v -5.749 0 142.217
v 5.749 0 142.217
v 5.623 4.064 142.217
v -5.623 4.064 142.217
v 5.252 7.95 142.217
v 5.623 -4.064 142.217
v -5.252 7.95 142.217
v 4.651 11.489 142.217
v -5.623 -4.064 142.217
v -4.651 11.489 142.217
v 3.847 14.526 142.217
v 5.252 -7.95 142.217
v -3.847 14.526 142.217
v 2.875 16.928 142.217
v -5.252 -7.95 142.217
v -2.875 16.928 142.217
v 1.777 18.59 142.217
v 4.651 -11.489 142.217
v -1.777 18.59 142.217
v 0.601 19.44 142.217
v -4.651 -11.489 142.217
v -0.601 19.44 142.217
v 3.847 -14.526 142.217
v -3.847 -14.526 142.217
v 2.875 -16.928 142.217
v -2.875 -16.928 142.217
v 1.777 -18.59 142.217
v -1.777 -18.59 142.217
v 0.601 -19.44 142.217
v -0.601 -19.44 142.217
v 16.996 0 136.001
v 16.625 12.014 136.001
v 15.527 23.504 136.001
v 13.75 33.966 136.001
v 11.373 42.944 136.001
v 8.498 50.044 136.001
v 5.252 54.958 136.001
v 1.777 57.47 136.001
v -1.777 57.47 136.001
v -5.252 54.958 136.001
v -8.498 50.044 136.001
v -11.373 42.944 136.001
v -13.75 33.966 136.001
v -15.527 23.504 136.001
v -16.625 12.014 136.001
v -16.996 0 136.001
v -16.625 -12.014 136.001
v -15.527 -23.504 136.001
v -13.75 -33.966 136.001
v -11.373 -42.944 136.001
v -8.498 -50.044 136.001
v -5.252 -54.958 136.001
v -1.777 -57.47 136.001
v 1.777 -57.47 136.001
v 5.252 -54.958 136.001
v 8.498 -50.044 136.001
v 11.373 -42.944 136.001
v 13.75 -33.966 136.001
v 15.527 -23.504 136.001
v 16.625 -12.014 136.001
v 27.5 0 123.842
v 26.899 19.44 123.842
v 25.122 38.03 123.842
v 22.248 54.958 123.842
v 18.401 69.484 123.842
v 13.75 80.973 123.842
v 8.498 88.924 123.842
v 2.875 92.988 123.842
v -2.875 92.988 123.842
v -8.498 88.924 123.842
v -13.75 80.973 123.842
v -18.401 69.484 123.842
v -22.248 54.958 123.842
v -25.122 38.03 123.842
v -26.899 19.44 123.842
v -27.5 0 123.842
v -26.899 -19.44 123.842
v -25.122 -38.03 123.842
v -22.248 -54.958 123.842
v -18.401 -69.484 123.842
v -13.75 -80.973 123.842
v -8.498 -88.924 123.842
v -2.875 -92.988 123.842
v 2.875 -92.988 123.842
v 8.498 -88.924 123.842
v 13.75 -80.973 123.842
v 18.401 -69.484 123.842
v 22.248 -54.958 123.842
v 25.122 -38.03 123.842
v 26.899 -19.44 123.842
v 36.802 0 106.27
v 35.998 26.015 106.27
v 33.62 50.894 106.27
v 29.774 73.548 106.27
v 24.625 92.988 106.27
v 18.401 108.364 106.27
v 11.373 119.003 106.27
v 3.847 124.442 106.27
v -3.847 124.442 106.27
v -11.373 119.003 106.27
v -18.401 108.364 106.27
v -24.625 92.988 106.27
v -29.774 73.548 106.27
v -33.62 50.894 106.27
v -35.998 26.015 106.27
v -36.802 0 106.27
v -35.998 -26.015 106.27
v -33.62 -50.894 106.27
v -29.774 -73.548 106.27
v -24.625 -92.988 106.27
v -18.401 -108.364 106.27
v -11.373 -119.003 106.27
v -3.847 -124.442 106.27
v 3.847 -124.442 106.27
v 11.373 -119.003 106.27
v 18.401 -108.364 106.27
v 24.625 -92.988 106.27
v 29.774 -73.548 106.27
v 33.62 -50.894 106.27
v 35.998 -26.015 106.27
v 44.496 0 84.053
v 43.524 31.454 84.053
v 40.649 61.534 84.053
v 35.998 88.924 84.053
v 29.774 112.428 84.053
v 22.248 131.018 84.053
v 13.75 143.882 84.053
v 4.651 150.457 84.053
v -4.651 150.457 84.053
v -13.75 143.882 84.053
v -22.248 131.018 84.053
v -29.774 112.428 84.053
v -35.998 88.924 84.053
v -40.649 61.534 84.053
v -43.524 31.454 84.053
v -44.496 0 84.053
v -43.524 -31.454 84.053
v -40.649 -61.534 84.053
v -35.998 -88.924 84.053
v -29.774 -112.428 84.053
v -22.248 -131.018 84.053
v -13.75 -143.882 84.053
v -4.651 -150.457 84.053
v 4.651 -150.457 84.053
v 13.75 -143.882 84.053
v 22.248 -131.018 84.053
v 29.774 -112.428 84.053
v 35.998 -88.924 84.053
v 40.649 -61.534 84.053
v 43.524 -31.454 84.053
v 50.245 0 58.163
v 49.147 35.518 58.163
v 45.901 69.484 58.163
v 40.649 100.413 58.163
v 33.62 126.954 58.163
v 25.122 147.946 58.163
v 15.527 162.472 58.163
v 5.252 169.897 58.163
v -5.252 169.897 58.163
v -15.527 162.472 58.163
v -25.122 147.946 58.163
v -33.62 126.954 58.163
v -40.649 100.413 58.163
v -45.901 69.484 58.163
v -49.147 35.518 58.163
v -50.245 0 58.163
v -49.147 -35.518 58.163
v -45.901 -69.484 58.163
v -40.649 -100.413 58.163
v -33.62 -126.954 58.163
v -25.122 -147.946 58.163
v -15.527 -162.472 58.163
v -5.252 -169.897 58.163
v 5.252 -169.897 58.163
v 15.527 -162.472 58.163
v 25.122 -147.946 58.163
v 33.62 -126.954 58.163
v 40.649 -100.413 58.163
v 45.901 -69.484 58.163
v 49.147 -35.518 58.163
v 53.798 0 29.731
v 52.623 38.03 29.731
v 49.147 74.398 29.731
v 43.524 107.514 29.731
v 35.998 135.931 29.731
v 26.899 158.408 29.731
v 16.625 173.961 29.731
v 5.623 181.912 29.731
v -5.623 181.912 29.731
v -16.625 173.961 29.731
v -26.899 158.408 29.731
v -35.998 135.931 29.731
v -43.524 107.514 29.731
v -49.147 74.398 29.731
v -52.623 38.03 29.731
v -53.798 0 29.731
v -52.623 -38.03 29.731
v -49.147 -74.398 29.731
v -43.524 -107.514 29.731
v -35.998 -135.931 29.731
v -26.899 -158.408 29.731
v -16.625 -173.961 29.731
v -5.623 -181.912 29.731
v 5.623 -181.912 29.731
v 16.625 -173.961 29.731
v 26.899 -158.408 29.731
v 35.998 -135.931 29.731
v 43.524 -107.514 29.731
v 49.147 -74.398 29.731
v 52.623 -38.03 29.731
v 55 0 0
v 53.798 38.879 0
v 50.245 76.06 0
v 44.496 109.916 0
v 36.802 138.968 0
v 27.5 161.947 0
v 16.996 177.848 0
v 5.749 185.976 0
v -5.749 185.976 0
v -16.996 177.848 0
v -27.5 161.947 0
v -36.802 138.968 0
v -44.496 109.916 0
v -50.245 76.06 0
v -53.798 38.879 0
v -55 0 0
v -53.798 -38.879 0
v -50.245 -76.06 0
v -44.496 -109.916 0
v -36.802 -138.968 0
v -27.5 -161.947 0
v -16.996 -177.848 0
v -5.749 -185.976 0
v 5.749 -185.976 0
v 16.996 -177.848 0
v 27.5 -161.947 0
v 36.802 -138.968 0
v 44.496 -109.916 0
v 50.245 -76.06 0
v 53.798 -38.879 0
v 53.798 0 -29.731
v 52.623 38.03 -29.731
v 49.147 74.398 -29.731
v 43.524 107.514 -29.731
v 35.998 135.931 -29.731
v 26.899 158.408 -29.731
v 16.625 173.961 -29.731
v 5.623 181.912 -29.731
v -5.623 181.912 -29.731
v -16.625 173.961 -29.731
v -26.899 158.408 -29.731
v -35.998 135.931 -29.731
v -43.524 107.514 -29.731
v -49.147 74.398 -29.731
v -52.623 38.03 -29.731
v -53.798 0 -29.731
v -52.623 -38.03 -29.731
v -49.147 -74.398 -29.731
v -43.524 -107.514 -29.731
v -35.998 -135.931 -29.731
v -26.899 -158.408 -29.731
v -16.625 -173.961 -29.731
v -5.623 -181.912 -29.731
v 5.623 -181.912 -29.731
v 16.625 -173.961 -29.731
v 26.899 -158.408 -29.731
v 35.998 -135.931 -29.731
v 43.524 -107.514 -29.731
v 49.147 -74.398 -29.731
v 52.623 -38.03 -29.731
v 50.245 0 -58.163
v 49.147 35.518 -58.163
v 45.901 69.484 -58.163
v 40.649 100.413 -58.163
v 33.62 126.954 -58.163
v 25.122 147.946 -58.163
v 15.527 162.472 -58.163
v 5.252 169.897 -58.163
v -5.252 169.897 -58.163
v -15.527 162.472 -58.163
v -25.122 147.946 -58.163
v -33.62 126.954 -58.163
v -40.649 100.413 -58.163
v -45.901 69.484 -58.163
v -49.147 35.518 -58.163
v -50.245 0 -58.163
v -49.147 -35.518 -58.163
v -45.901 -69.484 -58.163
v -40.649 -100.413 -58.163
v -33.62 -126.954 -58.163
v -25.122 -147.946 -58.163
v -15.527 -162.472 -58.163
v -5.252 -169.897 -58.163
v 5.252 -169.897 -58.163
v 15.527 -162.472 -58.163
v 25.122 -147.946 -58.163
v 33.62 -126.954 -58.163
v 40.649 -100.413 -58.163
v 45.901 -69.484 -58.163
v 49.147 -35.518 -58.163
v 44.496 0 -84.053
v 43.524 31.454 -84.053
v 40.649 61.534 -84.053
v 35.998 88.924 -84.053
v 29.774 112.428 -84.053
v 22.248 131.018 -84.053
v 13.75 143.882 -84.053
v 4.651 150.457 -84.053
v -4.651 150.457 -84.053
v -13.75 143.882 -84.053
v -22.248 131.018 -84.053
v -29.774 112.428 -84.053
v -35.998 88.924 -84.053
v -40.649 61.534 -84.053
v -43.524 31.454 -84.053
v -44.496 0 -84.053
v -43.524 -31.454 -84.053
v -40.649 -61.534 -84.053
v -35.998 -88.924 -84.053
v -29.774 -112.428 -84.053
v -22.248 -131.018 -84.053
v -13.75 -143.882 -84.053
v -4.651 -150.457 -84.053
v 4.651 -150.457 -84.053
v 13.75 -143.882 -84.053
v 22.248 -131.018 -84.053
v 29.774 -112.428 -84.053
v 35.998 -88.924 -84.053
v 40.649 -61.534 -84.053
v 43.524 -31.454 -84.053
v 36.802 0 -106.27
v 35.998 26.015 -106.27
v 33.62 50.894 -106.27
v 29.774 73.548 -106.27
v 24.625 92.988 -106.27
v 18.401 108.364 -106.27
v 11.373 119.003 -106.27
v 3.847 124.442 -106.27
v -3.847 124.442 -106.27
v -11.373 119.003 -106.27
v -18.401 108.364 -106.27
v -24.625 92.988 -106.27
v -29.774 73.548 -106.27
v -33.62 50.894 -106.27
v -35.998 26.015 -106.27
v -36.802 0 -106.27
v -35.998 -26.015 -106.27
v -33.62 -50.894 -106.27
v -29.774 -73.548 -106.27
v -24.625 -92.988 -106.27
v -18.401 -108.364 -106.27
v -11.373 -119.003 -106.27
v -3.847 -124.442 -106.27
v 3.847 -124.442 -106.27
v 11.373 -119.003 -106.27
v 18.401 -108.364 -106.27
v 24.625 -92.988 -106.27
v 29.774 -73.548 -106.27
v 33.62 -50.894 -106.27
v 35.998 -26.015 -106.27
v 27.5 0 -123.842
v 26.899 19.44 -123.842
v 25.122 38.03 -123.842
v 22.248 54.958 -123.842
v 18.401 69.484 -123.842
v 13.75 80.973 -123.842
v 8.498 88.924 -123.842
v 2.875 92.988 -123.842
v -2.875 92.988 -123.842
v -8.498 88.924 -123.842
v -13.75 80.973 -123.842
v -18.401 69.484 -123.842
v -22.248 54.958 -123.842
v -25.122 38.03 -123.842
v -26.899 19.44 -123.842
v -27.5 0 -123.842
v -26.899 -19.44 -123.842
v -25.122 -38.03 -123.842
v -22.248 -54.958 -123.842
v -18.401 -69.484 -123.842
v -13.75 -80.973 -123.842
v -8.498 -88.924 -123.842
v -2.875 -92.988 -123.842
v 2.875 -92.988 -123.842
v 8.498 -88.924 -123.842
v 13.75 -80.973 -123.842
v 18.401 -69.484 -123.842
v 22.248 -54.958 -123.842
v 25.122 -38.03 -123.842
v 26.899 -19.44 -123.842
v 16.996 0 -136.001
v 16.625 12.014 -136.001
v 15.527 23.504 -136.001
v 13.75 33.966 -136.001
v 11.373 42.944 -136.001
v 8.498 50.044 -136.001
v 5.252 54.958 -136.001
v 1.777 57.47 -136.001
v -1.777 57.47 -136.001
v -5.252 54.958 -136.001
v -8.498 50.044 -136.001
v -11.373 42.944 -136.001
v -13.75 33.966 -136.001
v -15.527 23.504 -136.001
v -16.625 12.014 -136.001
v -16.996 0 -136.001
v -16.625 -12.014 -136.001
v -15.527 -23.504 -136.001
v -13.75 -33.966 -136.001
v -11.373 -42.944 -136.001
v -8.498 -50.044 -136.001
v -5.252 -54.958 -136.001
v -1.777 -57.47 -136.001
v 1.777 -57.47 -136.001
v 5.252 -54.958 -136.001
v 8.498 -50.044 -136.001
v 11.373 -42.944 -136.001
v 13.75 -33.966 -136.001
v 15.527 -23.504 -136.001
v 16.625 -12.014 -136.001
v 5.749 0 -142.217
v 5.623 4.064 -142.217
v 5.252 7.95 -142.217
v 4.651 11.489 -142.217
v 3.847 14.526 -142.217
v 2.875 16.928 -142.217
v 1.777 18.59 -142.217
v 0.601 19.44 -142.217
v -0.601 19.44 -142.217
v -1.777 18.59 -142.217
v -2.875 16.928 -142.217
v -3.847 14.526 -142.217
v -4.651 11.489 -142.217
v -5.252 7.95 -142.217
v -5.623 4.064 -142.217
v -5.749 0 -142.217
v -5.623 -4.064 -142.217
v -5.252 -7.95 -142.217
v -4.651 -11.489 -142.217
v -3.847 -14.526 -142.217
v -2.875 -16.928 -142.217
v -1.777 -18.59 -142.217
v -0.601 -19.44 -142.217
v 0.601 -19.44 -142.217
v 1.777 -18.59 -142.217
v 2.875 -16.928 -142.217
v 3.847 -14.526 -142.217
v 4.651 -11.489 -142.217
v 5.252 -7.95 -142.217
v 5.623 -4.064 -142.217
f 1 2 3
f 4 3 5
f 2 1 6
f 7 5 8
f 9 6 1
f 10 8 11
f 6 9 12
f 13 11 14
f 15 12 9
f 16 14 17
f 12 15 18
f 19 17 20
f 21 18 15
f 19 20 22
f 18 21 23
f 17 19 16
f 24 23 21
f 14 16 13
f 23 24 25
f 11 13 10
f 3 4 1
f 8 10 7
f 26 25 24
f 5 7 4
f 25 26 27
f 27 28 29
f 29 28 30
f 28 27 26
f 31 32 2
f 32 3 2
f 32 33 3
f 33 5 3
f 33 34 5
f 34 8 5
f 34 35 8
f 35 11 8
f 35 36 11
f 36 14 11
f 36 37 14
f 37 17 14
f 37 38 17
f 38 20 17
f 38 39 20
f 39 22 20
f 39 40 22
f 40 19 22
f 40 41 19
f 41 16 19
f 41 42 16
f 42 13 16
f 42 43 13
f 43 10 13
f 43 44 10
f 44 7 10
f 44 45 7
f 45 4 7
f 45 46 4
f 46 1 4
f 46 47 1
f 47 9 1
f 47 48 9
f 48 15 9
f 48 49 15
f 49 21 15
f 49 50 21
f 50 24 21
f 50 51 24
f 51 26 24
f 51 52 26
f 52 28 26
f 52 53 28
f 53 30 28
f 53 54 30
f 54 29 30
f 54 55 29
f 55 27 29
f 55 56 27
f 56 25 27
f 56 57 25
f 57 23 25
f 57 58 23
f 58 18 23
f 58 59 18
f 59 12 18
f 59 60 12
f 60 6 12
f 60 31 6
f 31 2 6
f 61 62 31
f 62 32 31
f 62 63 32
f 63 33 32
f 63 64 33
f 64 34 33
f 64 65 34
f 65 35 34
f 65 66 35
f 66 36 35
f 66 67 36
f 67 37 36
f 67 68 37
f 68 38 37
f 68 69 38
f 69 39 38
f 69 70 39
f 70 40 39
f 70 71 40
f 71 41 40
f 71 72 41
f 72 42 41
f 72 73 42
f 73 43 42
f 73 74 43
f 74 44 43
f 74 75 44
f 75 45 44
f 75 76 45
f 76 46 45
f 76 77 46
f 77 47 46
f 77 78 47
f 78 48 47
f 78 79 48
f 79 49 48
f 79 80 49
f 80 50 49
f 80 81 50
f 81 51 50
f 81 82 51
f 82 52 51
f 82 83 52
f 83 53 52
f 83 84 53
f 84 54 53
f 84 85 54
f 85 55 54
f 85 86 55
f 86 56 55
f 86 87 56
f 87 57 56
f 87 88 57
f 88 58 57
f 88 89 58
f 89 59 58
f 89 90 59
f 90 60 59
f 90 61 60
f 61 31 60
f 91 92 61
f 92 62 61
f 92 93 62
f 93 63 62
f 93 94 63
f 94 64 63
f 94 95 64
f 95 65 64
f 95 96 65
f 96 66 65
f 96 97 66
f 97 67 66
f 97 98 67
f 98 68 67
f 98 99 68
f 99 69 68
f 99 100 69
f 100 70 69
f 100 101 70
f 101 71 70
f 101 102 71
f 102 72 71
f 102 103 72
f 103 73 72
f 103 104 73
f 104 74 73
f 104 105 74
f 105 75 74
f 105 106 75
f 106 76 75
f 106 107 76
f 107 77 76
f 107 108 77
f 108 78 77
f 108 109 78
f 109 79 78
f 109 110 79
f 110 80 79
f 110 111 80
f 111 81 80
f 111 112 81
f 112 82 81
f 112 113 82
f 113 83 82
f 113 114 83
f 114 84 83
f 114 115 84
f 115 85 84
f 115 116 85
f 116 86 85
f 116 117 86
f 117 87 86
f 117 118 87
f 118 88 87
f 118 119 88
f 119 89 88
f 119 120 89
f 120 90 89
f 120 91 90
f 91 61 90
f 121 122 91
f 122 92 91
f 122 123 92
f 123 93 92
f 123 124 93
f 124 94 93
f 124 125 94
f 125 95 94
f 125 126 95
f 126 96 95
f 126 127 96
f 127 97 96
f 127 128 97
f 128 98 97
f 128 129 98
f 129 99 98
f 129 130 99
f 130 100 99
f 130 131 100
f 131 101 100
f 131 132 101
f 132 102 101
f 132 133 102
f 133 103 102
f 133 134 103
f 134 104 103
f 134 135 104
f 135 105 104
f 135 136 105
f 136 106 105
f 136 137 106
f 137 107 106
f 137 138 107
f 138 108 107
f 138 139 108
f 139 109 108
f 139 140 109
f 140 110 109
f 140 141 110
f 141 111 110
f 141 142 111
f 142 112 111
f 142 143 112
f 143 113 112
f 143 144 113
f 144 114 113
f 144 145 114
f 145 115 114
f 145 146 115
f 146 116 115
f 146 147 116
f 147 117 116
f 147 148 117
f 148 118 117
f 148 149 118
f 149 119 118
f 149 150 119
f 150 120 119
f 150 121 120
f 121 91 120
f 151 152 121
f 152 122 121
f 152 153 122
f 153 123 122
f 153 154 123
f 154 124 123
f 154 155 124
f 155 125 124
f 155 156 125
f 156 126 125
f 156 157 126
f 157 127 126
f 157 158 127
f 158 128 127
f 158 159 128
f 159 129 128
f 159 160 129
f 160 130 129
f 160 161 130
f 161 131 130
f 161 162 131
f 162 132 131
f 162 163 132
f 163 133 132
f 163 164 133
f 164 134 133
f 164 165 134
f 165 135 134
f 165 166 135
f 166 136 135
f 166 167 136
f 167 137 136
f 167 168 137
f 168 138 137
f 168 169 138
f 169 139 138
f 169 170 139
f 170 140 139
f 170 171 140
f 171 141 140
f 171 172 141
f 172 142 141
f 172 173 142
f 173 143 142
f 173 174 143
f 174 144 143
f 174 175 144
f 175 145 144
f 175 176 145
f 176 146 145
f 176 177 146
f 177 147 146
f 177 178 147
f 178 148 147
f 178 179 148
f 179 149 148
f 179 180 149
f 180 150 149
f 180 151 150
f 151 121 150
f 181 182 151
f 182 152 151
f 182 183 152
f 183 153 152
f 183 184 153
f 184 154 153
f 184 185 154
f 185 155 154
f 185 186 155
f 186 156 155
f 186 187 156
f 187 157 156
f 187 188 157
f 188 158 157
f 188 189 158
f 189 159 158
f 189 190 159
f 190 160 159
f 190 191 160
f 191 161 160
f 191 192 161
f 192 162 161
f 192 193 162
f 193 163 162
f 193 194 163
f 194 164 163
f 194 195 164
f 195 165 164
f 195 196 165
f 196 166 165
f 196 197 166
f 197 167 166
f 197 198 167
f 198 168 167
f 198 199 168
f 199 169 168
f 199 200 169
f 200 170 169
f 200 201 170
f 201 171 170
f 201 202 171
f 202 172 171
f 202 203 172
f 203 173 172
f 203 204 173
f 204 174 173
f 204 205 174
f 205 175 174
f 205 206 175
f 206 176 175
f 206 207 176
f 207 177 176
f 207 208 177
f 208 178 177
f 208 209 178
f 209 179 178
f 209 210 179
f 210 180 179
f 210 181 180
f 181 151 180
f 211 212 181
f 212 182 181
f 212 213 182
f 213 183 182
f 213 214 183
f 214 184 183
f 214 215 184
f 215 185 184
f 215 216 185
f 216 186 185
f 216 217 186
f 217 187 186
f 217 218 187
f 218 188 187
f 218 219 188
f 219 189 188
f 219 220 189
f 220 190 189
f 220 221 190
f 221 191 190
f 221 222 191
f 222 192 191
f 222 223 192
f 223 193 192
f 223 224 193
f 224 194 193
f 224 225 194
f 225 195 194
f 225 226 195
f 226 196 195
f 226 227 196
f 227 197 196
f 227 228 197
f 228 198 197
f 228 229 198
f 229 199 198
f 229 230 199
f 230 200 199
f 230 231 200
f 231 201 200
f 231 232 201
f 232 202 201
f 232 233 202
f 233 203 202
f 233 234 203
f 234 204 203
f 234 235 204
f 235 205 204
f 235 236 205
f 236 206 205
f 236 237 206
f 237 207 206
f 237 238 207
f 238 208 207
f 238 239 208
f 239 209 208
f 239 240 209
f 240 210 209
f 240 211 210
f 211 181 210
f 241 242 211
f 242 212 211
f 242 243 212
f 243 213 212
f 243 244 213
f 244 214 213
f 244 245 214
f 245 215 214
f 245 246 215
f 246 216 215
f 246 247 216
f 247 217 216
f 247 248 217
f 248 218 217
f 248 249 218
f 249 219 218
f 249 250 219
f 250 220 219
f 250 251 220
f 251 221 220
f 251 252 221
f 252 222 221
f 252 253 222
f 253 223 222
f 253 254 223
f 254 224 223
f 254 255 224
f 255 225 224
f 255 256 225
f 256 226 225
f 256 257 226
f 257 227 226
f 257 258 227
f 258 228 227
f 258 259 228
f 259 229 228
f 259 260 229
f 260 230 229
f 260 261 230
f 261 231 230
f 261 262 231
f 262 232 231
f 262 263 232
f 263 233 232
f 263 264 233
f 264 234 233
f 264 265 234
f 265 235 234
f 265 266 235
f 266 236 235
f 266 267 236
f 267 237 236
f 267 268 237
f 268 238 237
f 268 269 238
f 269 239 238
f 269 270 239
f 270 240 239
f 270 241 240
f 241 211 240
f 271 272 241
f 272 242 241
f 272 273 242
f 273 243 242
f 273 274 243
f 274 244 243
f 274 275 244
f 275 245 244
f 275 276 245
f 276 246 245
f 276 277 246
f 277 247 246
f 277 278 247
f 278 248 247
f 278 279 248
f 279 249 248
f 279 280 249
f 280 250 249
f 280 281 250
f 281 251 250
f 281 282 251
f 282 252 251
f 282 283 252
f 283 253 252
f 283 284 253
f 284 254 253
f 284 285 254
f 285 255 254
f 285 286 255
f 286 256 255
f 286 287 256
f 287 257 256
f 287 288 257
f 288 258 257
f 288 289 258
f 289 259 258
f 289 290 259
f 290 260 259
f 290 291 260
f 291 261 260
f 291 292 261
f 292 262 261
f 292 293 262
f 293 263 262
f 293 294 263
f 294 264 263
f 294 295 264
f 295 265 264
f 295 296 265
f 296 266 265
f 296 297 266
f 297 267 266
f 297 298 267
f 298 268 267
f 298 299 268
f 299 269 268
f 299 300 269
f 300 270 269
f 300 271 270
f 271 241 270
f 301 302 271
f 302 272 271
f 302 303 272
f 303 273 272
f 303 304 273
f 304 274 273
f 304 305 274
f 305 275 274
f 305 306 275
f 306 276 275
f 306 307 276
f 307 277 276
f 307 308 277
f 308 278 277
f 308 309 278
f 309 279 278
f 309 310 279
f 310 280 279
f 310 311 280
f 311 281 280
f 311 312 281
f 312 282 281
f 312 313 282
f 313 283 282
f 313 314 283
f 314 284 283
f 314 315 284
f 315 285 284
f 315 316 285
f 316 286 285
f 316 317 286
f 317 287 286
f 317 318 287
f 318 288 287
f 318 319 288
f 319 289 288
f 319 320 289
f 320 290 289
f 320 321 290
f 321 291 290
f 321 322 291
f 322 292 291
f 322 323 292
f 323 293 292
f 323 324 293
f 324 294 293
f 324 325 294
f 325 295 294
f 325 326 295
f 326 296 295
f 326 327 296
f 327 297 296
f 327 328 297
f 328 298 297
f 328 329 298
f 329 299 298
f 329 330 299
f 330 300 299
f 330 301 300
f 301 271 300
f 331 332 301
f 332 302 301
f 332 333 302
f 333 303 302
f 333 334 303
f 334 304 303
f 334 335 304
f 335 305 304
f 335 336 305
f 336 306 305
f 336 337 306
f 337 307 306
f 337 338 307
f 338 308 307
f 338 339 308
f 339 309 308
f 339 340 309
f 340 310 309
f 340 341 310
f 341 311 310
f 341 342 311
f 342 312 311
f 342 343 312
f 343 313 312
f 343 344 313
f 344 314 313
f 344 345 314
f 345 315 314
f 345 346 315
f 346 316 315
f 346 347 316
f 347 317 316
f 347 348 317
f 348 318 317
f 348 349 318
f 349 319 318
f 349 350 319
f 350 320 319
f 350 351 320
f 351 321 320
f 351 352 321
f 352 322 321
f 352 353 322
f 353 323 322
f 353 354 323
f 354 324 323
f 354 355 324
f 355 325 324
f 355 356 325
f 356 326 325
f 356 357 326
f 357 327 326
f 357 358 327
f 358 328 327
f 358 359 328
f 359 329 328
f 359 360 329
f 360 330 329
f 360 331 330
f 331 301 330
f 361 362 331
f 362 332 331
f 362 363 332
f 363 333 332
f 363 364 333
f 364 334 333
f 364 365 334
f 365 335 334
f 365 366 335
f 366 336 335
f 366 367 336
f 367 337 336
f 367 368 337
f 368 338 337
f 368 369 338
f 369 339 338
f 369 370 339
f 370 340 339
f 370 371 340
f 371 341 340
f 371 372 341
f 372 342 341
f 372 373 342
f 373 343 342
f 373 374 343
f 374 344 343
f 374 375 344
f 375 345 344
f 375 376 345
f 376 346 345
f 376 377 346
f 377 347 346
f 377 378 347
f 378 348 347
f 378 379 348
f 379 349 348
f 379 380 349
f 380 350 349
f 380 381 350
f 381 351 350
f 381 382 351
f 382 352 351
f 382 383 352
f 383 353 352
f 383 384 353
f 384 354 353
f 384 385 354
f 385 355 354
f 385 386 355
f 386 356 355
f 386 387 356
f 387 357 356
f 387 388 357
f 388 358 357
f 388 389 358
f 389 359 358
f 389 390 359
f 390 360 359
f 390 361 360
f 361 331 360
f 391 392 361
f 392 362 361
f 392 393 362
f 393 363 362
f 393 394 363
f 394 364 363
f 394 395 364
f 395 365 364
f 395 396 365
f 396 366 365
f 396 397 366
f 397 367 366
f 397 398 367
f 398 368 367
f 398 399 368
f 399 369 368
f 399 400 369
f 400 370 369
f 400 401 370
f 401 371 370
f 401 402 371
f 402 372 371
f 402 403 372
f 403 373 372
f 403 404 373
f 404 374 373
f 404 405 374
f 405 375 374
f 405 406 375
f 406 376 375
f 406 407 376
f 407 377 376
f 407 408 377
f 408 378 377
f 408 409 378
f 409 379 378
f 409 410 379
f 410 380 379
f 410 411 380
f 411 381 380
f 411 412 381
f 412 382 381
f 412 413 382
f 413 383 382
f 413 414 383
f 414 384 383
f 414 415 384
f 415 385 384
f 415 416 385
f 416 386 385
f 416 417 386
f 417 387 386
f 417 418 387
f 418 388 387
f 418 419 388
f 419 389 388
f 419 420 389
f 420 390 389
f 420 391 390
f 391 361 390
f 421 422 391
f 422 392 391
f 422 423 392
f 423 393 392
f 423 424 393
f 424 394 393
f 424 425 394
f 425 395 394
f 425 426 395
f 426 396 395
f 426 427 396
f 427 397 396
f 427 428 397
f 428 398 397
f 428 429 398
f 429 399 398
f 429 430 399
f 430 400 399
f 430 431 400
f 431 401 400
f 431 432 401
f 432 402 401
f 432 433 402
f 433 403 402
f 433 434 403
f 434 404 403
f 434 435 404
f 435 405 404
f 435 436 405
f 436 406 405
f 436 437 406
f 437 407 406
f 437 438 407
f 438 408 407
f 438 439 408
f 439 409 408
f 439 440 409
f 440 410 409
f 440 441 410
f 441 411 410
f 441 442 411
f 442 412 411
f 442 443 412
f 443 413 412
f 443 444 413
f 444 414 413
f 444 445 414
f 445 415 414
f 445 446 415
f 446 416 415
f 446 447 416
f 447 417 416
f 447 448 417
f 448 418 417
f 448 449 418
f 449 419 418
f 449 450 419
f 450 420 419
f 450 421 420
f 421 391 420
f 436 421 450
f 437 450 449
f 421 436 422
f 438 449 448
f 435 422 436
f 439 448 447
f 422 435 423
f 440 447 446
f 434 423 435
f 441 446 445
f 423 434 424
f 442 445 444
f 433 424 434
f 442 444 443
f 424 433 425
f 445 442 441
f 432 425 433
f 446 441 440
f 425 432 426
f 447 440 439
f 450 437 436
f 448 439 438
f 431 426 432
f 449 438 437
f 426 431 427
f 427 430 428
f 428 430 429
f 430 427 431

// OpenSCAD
// Generated by SolidPython 1.0.1 on 2020-07-29 00:46:47


scale(v = [5, 17, 13]) {
	sphere(r = 11);
}
/***********************************************
*********      SolidPython code:      **********
************************************************
 
# import packages: SolidPython
from solid import *
from solid.utils import *
from itertools import chain, combinations, permutations


class Resize:

    def __init__(self, scad_file):
        self.scad_file = scad_file
        #self.scad_file = import_scad(scad_file)
        # cone/cylinder param:
        self.r1 = 0
        self.r2 = 0
        self.h = 0
        # rectangular prism param:
        self.w = 0
        self.l = 0
        # ellipse param:
        self.r = 0

    # import OpenScad code (file name corresponds to shape)


    # classify shape + parameters
    def assign(self, param1, param2, param3):
        if self.scad_file == 'cone.scad':
            self.r1 = param1
            self.r2 = param2
            self.h = param3
        elif self.scad_file == 'cylinder.scad':
            self.r1 = param1
            self.r2 = param2
            self.h = param3
        elif self.scad_file == 'rectangularPrism.scad':
            self.h = param1
            self.l = param2
            self.w = param3
        else:
            self.r = param1
            self.h = param2

    # resize parameters
    def iterate(self):
        x = range(3, 20, 2)
        i = 1
        if self.scad_file == 'cone.scad':
            tempList = list(permutations(x, 2))
            for temp in tempList:
                param1 = temp[0]
                param2 = temp[1]
                filepath = 'produced_scad_files/' + 'cone' + str(param1) + '_' + str(param2) + '_' + '.scad'
                scad_render_to_file(cylinder(h=param1, r1=param2, r2=0), filepath)

        elif self.scad_file == 'cylinder.scad':
            tempList = list(permutations(x, 3))
            for temp in tempList:
                param1 = temp[0]
                param2 = temp[1]
                filepath = 'produced_scad_files/' + 'cylinder' + str(param1) + '_' + str(param2) + '_' + '.scad'
                scad_render_to_file(cylinder(h=param1, r1=param2, r2=param2), filepath)

        elif self.scad_file == 'rectangularPrism.scad':
            tempList = list(permutations(x, 3))
            for temp in tempList:
                param1 = temp[0]
                param2 = temp[1]
                param3 = temp[2]
                filepath = 'produced_scad_files/' + 'rectangularPrism' + str(param1) + '_' + str(param2) + '_' + str(
                    param3) + '.scad'
                scad_render_to_file(cube(size=(param1, param2, param3)), filepath)

        elif self.scad_file == 'ellipse.scad':
            tempList = list(permutations(x, 4))
            for temp in tempList:
                param1 = temp[0]
                param2 = temp[1]
                param3 = temp[2]
                param4 = temp[3]
                filepath = 'produced_scad_files/' + 'ellipse' + str(param1) + '_' + str(param2) + '_' + str(param3) + '_' + str(param4) + '.scad'
                scad_render_to_file(scale([param1, param2, param3])(sphere(r=param4)), filepath)

    def render_to_scadfile(self):
        scad_render_to_file(scad, 'example.scad') 
 
************************************************/
